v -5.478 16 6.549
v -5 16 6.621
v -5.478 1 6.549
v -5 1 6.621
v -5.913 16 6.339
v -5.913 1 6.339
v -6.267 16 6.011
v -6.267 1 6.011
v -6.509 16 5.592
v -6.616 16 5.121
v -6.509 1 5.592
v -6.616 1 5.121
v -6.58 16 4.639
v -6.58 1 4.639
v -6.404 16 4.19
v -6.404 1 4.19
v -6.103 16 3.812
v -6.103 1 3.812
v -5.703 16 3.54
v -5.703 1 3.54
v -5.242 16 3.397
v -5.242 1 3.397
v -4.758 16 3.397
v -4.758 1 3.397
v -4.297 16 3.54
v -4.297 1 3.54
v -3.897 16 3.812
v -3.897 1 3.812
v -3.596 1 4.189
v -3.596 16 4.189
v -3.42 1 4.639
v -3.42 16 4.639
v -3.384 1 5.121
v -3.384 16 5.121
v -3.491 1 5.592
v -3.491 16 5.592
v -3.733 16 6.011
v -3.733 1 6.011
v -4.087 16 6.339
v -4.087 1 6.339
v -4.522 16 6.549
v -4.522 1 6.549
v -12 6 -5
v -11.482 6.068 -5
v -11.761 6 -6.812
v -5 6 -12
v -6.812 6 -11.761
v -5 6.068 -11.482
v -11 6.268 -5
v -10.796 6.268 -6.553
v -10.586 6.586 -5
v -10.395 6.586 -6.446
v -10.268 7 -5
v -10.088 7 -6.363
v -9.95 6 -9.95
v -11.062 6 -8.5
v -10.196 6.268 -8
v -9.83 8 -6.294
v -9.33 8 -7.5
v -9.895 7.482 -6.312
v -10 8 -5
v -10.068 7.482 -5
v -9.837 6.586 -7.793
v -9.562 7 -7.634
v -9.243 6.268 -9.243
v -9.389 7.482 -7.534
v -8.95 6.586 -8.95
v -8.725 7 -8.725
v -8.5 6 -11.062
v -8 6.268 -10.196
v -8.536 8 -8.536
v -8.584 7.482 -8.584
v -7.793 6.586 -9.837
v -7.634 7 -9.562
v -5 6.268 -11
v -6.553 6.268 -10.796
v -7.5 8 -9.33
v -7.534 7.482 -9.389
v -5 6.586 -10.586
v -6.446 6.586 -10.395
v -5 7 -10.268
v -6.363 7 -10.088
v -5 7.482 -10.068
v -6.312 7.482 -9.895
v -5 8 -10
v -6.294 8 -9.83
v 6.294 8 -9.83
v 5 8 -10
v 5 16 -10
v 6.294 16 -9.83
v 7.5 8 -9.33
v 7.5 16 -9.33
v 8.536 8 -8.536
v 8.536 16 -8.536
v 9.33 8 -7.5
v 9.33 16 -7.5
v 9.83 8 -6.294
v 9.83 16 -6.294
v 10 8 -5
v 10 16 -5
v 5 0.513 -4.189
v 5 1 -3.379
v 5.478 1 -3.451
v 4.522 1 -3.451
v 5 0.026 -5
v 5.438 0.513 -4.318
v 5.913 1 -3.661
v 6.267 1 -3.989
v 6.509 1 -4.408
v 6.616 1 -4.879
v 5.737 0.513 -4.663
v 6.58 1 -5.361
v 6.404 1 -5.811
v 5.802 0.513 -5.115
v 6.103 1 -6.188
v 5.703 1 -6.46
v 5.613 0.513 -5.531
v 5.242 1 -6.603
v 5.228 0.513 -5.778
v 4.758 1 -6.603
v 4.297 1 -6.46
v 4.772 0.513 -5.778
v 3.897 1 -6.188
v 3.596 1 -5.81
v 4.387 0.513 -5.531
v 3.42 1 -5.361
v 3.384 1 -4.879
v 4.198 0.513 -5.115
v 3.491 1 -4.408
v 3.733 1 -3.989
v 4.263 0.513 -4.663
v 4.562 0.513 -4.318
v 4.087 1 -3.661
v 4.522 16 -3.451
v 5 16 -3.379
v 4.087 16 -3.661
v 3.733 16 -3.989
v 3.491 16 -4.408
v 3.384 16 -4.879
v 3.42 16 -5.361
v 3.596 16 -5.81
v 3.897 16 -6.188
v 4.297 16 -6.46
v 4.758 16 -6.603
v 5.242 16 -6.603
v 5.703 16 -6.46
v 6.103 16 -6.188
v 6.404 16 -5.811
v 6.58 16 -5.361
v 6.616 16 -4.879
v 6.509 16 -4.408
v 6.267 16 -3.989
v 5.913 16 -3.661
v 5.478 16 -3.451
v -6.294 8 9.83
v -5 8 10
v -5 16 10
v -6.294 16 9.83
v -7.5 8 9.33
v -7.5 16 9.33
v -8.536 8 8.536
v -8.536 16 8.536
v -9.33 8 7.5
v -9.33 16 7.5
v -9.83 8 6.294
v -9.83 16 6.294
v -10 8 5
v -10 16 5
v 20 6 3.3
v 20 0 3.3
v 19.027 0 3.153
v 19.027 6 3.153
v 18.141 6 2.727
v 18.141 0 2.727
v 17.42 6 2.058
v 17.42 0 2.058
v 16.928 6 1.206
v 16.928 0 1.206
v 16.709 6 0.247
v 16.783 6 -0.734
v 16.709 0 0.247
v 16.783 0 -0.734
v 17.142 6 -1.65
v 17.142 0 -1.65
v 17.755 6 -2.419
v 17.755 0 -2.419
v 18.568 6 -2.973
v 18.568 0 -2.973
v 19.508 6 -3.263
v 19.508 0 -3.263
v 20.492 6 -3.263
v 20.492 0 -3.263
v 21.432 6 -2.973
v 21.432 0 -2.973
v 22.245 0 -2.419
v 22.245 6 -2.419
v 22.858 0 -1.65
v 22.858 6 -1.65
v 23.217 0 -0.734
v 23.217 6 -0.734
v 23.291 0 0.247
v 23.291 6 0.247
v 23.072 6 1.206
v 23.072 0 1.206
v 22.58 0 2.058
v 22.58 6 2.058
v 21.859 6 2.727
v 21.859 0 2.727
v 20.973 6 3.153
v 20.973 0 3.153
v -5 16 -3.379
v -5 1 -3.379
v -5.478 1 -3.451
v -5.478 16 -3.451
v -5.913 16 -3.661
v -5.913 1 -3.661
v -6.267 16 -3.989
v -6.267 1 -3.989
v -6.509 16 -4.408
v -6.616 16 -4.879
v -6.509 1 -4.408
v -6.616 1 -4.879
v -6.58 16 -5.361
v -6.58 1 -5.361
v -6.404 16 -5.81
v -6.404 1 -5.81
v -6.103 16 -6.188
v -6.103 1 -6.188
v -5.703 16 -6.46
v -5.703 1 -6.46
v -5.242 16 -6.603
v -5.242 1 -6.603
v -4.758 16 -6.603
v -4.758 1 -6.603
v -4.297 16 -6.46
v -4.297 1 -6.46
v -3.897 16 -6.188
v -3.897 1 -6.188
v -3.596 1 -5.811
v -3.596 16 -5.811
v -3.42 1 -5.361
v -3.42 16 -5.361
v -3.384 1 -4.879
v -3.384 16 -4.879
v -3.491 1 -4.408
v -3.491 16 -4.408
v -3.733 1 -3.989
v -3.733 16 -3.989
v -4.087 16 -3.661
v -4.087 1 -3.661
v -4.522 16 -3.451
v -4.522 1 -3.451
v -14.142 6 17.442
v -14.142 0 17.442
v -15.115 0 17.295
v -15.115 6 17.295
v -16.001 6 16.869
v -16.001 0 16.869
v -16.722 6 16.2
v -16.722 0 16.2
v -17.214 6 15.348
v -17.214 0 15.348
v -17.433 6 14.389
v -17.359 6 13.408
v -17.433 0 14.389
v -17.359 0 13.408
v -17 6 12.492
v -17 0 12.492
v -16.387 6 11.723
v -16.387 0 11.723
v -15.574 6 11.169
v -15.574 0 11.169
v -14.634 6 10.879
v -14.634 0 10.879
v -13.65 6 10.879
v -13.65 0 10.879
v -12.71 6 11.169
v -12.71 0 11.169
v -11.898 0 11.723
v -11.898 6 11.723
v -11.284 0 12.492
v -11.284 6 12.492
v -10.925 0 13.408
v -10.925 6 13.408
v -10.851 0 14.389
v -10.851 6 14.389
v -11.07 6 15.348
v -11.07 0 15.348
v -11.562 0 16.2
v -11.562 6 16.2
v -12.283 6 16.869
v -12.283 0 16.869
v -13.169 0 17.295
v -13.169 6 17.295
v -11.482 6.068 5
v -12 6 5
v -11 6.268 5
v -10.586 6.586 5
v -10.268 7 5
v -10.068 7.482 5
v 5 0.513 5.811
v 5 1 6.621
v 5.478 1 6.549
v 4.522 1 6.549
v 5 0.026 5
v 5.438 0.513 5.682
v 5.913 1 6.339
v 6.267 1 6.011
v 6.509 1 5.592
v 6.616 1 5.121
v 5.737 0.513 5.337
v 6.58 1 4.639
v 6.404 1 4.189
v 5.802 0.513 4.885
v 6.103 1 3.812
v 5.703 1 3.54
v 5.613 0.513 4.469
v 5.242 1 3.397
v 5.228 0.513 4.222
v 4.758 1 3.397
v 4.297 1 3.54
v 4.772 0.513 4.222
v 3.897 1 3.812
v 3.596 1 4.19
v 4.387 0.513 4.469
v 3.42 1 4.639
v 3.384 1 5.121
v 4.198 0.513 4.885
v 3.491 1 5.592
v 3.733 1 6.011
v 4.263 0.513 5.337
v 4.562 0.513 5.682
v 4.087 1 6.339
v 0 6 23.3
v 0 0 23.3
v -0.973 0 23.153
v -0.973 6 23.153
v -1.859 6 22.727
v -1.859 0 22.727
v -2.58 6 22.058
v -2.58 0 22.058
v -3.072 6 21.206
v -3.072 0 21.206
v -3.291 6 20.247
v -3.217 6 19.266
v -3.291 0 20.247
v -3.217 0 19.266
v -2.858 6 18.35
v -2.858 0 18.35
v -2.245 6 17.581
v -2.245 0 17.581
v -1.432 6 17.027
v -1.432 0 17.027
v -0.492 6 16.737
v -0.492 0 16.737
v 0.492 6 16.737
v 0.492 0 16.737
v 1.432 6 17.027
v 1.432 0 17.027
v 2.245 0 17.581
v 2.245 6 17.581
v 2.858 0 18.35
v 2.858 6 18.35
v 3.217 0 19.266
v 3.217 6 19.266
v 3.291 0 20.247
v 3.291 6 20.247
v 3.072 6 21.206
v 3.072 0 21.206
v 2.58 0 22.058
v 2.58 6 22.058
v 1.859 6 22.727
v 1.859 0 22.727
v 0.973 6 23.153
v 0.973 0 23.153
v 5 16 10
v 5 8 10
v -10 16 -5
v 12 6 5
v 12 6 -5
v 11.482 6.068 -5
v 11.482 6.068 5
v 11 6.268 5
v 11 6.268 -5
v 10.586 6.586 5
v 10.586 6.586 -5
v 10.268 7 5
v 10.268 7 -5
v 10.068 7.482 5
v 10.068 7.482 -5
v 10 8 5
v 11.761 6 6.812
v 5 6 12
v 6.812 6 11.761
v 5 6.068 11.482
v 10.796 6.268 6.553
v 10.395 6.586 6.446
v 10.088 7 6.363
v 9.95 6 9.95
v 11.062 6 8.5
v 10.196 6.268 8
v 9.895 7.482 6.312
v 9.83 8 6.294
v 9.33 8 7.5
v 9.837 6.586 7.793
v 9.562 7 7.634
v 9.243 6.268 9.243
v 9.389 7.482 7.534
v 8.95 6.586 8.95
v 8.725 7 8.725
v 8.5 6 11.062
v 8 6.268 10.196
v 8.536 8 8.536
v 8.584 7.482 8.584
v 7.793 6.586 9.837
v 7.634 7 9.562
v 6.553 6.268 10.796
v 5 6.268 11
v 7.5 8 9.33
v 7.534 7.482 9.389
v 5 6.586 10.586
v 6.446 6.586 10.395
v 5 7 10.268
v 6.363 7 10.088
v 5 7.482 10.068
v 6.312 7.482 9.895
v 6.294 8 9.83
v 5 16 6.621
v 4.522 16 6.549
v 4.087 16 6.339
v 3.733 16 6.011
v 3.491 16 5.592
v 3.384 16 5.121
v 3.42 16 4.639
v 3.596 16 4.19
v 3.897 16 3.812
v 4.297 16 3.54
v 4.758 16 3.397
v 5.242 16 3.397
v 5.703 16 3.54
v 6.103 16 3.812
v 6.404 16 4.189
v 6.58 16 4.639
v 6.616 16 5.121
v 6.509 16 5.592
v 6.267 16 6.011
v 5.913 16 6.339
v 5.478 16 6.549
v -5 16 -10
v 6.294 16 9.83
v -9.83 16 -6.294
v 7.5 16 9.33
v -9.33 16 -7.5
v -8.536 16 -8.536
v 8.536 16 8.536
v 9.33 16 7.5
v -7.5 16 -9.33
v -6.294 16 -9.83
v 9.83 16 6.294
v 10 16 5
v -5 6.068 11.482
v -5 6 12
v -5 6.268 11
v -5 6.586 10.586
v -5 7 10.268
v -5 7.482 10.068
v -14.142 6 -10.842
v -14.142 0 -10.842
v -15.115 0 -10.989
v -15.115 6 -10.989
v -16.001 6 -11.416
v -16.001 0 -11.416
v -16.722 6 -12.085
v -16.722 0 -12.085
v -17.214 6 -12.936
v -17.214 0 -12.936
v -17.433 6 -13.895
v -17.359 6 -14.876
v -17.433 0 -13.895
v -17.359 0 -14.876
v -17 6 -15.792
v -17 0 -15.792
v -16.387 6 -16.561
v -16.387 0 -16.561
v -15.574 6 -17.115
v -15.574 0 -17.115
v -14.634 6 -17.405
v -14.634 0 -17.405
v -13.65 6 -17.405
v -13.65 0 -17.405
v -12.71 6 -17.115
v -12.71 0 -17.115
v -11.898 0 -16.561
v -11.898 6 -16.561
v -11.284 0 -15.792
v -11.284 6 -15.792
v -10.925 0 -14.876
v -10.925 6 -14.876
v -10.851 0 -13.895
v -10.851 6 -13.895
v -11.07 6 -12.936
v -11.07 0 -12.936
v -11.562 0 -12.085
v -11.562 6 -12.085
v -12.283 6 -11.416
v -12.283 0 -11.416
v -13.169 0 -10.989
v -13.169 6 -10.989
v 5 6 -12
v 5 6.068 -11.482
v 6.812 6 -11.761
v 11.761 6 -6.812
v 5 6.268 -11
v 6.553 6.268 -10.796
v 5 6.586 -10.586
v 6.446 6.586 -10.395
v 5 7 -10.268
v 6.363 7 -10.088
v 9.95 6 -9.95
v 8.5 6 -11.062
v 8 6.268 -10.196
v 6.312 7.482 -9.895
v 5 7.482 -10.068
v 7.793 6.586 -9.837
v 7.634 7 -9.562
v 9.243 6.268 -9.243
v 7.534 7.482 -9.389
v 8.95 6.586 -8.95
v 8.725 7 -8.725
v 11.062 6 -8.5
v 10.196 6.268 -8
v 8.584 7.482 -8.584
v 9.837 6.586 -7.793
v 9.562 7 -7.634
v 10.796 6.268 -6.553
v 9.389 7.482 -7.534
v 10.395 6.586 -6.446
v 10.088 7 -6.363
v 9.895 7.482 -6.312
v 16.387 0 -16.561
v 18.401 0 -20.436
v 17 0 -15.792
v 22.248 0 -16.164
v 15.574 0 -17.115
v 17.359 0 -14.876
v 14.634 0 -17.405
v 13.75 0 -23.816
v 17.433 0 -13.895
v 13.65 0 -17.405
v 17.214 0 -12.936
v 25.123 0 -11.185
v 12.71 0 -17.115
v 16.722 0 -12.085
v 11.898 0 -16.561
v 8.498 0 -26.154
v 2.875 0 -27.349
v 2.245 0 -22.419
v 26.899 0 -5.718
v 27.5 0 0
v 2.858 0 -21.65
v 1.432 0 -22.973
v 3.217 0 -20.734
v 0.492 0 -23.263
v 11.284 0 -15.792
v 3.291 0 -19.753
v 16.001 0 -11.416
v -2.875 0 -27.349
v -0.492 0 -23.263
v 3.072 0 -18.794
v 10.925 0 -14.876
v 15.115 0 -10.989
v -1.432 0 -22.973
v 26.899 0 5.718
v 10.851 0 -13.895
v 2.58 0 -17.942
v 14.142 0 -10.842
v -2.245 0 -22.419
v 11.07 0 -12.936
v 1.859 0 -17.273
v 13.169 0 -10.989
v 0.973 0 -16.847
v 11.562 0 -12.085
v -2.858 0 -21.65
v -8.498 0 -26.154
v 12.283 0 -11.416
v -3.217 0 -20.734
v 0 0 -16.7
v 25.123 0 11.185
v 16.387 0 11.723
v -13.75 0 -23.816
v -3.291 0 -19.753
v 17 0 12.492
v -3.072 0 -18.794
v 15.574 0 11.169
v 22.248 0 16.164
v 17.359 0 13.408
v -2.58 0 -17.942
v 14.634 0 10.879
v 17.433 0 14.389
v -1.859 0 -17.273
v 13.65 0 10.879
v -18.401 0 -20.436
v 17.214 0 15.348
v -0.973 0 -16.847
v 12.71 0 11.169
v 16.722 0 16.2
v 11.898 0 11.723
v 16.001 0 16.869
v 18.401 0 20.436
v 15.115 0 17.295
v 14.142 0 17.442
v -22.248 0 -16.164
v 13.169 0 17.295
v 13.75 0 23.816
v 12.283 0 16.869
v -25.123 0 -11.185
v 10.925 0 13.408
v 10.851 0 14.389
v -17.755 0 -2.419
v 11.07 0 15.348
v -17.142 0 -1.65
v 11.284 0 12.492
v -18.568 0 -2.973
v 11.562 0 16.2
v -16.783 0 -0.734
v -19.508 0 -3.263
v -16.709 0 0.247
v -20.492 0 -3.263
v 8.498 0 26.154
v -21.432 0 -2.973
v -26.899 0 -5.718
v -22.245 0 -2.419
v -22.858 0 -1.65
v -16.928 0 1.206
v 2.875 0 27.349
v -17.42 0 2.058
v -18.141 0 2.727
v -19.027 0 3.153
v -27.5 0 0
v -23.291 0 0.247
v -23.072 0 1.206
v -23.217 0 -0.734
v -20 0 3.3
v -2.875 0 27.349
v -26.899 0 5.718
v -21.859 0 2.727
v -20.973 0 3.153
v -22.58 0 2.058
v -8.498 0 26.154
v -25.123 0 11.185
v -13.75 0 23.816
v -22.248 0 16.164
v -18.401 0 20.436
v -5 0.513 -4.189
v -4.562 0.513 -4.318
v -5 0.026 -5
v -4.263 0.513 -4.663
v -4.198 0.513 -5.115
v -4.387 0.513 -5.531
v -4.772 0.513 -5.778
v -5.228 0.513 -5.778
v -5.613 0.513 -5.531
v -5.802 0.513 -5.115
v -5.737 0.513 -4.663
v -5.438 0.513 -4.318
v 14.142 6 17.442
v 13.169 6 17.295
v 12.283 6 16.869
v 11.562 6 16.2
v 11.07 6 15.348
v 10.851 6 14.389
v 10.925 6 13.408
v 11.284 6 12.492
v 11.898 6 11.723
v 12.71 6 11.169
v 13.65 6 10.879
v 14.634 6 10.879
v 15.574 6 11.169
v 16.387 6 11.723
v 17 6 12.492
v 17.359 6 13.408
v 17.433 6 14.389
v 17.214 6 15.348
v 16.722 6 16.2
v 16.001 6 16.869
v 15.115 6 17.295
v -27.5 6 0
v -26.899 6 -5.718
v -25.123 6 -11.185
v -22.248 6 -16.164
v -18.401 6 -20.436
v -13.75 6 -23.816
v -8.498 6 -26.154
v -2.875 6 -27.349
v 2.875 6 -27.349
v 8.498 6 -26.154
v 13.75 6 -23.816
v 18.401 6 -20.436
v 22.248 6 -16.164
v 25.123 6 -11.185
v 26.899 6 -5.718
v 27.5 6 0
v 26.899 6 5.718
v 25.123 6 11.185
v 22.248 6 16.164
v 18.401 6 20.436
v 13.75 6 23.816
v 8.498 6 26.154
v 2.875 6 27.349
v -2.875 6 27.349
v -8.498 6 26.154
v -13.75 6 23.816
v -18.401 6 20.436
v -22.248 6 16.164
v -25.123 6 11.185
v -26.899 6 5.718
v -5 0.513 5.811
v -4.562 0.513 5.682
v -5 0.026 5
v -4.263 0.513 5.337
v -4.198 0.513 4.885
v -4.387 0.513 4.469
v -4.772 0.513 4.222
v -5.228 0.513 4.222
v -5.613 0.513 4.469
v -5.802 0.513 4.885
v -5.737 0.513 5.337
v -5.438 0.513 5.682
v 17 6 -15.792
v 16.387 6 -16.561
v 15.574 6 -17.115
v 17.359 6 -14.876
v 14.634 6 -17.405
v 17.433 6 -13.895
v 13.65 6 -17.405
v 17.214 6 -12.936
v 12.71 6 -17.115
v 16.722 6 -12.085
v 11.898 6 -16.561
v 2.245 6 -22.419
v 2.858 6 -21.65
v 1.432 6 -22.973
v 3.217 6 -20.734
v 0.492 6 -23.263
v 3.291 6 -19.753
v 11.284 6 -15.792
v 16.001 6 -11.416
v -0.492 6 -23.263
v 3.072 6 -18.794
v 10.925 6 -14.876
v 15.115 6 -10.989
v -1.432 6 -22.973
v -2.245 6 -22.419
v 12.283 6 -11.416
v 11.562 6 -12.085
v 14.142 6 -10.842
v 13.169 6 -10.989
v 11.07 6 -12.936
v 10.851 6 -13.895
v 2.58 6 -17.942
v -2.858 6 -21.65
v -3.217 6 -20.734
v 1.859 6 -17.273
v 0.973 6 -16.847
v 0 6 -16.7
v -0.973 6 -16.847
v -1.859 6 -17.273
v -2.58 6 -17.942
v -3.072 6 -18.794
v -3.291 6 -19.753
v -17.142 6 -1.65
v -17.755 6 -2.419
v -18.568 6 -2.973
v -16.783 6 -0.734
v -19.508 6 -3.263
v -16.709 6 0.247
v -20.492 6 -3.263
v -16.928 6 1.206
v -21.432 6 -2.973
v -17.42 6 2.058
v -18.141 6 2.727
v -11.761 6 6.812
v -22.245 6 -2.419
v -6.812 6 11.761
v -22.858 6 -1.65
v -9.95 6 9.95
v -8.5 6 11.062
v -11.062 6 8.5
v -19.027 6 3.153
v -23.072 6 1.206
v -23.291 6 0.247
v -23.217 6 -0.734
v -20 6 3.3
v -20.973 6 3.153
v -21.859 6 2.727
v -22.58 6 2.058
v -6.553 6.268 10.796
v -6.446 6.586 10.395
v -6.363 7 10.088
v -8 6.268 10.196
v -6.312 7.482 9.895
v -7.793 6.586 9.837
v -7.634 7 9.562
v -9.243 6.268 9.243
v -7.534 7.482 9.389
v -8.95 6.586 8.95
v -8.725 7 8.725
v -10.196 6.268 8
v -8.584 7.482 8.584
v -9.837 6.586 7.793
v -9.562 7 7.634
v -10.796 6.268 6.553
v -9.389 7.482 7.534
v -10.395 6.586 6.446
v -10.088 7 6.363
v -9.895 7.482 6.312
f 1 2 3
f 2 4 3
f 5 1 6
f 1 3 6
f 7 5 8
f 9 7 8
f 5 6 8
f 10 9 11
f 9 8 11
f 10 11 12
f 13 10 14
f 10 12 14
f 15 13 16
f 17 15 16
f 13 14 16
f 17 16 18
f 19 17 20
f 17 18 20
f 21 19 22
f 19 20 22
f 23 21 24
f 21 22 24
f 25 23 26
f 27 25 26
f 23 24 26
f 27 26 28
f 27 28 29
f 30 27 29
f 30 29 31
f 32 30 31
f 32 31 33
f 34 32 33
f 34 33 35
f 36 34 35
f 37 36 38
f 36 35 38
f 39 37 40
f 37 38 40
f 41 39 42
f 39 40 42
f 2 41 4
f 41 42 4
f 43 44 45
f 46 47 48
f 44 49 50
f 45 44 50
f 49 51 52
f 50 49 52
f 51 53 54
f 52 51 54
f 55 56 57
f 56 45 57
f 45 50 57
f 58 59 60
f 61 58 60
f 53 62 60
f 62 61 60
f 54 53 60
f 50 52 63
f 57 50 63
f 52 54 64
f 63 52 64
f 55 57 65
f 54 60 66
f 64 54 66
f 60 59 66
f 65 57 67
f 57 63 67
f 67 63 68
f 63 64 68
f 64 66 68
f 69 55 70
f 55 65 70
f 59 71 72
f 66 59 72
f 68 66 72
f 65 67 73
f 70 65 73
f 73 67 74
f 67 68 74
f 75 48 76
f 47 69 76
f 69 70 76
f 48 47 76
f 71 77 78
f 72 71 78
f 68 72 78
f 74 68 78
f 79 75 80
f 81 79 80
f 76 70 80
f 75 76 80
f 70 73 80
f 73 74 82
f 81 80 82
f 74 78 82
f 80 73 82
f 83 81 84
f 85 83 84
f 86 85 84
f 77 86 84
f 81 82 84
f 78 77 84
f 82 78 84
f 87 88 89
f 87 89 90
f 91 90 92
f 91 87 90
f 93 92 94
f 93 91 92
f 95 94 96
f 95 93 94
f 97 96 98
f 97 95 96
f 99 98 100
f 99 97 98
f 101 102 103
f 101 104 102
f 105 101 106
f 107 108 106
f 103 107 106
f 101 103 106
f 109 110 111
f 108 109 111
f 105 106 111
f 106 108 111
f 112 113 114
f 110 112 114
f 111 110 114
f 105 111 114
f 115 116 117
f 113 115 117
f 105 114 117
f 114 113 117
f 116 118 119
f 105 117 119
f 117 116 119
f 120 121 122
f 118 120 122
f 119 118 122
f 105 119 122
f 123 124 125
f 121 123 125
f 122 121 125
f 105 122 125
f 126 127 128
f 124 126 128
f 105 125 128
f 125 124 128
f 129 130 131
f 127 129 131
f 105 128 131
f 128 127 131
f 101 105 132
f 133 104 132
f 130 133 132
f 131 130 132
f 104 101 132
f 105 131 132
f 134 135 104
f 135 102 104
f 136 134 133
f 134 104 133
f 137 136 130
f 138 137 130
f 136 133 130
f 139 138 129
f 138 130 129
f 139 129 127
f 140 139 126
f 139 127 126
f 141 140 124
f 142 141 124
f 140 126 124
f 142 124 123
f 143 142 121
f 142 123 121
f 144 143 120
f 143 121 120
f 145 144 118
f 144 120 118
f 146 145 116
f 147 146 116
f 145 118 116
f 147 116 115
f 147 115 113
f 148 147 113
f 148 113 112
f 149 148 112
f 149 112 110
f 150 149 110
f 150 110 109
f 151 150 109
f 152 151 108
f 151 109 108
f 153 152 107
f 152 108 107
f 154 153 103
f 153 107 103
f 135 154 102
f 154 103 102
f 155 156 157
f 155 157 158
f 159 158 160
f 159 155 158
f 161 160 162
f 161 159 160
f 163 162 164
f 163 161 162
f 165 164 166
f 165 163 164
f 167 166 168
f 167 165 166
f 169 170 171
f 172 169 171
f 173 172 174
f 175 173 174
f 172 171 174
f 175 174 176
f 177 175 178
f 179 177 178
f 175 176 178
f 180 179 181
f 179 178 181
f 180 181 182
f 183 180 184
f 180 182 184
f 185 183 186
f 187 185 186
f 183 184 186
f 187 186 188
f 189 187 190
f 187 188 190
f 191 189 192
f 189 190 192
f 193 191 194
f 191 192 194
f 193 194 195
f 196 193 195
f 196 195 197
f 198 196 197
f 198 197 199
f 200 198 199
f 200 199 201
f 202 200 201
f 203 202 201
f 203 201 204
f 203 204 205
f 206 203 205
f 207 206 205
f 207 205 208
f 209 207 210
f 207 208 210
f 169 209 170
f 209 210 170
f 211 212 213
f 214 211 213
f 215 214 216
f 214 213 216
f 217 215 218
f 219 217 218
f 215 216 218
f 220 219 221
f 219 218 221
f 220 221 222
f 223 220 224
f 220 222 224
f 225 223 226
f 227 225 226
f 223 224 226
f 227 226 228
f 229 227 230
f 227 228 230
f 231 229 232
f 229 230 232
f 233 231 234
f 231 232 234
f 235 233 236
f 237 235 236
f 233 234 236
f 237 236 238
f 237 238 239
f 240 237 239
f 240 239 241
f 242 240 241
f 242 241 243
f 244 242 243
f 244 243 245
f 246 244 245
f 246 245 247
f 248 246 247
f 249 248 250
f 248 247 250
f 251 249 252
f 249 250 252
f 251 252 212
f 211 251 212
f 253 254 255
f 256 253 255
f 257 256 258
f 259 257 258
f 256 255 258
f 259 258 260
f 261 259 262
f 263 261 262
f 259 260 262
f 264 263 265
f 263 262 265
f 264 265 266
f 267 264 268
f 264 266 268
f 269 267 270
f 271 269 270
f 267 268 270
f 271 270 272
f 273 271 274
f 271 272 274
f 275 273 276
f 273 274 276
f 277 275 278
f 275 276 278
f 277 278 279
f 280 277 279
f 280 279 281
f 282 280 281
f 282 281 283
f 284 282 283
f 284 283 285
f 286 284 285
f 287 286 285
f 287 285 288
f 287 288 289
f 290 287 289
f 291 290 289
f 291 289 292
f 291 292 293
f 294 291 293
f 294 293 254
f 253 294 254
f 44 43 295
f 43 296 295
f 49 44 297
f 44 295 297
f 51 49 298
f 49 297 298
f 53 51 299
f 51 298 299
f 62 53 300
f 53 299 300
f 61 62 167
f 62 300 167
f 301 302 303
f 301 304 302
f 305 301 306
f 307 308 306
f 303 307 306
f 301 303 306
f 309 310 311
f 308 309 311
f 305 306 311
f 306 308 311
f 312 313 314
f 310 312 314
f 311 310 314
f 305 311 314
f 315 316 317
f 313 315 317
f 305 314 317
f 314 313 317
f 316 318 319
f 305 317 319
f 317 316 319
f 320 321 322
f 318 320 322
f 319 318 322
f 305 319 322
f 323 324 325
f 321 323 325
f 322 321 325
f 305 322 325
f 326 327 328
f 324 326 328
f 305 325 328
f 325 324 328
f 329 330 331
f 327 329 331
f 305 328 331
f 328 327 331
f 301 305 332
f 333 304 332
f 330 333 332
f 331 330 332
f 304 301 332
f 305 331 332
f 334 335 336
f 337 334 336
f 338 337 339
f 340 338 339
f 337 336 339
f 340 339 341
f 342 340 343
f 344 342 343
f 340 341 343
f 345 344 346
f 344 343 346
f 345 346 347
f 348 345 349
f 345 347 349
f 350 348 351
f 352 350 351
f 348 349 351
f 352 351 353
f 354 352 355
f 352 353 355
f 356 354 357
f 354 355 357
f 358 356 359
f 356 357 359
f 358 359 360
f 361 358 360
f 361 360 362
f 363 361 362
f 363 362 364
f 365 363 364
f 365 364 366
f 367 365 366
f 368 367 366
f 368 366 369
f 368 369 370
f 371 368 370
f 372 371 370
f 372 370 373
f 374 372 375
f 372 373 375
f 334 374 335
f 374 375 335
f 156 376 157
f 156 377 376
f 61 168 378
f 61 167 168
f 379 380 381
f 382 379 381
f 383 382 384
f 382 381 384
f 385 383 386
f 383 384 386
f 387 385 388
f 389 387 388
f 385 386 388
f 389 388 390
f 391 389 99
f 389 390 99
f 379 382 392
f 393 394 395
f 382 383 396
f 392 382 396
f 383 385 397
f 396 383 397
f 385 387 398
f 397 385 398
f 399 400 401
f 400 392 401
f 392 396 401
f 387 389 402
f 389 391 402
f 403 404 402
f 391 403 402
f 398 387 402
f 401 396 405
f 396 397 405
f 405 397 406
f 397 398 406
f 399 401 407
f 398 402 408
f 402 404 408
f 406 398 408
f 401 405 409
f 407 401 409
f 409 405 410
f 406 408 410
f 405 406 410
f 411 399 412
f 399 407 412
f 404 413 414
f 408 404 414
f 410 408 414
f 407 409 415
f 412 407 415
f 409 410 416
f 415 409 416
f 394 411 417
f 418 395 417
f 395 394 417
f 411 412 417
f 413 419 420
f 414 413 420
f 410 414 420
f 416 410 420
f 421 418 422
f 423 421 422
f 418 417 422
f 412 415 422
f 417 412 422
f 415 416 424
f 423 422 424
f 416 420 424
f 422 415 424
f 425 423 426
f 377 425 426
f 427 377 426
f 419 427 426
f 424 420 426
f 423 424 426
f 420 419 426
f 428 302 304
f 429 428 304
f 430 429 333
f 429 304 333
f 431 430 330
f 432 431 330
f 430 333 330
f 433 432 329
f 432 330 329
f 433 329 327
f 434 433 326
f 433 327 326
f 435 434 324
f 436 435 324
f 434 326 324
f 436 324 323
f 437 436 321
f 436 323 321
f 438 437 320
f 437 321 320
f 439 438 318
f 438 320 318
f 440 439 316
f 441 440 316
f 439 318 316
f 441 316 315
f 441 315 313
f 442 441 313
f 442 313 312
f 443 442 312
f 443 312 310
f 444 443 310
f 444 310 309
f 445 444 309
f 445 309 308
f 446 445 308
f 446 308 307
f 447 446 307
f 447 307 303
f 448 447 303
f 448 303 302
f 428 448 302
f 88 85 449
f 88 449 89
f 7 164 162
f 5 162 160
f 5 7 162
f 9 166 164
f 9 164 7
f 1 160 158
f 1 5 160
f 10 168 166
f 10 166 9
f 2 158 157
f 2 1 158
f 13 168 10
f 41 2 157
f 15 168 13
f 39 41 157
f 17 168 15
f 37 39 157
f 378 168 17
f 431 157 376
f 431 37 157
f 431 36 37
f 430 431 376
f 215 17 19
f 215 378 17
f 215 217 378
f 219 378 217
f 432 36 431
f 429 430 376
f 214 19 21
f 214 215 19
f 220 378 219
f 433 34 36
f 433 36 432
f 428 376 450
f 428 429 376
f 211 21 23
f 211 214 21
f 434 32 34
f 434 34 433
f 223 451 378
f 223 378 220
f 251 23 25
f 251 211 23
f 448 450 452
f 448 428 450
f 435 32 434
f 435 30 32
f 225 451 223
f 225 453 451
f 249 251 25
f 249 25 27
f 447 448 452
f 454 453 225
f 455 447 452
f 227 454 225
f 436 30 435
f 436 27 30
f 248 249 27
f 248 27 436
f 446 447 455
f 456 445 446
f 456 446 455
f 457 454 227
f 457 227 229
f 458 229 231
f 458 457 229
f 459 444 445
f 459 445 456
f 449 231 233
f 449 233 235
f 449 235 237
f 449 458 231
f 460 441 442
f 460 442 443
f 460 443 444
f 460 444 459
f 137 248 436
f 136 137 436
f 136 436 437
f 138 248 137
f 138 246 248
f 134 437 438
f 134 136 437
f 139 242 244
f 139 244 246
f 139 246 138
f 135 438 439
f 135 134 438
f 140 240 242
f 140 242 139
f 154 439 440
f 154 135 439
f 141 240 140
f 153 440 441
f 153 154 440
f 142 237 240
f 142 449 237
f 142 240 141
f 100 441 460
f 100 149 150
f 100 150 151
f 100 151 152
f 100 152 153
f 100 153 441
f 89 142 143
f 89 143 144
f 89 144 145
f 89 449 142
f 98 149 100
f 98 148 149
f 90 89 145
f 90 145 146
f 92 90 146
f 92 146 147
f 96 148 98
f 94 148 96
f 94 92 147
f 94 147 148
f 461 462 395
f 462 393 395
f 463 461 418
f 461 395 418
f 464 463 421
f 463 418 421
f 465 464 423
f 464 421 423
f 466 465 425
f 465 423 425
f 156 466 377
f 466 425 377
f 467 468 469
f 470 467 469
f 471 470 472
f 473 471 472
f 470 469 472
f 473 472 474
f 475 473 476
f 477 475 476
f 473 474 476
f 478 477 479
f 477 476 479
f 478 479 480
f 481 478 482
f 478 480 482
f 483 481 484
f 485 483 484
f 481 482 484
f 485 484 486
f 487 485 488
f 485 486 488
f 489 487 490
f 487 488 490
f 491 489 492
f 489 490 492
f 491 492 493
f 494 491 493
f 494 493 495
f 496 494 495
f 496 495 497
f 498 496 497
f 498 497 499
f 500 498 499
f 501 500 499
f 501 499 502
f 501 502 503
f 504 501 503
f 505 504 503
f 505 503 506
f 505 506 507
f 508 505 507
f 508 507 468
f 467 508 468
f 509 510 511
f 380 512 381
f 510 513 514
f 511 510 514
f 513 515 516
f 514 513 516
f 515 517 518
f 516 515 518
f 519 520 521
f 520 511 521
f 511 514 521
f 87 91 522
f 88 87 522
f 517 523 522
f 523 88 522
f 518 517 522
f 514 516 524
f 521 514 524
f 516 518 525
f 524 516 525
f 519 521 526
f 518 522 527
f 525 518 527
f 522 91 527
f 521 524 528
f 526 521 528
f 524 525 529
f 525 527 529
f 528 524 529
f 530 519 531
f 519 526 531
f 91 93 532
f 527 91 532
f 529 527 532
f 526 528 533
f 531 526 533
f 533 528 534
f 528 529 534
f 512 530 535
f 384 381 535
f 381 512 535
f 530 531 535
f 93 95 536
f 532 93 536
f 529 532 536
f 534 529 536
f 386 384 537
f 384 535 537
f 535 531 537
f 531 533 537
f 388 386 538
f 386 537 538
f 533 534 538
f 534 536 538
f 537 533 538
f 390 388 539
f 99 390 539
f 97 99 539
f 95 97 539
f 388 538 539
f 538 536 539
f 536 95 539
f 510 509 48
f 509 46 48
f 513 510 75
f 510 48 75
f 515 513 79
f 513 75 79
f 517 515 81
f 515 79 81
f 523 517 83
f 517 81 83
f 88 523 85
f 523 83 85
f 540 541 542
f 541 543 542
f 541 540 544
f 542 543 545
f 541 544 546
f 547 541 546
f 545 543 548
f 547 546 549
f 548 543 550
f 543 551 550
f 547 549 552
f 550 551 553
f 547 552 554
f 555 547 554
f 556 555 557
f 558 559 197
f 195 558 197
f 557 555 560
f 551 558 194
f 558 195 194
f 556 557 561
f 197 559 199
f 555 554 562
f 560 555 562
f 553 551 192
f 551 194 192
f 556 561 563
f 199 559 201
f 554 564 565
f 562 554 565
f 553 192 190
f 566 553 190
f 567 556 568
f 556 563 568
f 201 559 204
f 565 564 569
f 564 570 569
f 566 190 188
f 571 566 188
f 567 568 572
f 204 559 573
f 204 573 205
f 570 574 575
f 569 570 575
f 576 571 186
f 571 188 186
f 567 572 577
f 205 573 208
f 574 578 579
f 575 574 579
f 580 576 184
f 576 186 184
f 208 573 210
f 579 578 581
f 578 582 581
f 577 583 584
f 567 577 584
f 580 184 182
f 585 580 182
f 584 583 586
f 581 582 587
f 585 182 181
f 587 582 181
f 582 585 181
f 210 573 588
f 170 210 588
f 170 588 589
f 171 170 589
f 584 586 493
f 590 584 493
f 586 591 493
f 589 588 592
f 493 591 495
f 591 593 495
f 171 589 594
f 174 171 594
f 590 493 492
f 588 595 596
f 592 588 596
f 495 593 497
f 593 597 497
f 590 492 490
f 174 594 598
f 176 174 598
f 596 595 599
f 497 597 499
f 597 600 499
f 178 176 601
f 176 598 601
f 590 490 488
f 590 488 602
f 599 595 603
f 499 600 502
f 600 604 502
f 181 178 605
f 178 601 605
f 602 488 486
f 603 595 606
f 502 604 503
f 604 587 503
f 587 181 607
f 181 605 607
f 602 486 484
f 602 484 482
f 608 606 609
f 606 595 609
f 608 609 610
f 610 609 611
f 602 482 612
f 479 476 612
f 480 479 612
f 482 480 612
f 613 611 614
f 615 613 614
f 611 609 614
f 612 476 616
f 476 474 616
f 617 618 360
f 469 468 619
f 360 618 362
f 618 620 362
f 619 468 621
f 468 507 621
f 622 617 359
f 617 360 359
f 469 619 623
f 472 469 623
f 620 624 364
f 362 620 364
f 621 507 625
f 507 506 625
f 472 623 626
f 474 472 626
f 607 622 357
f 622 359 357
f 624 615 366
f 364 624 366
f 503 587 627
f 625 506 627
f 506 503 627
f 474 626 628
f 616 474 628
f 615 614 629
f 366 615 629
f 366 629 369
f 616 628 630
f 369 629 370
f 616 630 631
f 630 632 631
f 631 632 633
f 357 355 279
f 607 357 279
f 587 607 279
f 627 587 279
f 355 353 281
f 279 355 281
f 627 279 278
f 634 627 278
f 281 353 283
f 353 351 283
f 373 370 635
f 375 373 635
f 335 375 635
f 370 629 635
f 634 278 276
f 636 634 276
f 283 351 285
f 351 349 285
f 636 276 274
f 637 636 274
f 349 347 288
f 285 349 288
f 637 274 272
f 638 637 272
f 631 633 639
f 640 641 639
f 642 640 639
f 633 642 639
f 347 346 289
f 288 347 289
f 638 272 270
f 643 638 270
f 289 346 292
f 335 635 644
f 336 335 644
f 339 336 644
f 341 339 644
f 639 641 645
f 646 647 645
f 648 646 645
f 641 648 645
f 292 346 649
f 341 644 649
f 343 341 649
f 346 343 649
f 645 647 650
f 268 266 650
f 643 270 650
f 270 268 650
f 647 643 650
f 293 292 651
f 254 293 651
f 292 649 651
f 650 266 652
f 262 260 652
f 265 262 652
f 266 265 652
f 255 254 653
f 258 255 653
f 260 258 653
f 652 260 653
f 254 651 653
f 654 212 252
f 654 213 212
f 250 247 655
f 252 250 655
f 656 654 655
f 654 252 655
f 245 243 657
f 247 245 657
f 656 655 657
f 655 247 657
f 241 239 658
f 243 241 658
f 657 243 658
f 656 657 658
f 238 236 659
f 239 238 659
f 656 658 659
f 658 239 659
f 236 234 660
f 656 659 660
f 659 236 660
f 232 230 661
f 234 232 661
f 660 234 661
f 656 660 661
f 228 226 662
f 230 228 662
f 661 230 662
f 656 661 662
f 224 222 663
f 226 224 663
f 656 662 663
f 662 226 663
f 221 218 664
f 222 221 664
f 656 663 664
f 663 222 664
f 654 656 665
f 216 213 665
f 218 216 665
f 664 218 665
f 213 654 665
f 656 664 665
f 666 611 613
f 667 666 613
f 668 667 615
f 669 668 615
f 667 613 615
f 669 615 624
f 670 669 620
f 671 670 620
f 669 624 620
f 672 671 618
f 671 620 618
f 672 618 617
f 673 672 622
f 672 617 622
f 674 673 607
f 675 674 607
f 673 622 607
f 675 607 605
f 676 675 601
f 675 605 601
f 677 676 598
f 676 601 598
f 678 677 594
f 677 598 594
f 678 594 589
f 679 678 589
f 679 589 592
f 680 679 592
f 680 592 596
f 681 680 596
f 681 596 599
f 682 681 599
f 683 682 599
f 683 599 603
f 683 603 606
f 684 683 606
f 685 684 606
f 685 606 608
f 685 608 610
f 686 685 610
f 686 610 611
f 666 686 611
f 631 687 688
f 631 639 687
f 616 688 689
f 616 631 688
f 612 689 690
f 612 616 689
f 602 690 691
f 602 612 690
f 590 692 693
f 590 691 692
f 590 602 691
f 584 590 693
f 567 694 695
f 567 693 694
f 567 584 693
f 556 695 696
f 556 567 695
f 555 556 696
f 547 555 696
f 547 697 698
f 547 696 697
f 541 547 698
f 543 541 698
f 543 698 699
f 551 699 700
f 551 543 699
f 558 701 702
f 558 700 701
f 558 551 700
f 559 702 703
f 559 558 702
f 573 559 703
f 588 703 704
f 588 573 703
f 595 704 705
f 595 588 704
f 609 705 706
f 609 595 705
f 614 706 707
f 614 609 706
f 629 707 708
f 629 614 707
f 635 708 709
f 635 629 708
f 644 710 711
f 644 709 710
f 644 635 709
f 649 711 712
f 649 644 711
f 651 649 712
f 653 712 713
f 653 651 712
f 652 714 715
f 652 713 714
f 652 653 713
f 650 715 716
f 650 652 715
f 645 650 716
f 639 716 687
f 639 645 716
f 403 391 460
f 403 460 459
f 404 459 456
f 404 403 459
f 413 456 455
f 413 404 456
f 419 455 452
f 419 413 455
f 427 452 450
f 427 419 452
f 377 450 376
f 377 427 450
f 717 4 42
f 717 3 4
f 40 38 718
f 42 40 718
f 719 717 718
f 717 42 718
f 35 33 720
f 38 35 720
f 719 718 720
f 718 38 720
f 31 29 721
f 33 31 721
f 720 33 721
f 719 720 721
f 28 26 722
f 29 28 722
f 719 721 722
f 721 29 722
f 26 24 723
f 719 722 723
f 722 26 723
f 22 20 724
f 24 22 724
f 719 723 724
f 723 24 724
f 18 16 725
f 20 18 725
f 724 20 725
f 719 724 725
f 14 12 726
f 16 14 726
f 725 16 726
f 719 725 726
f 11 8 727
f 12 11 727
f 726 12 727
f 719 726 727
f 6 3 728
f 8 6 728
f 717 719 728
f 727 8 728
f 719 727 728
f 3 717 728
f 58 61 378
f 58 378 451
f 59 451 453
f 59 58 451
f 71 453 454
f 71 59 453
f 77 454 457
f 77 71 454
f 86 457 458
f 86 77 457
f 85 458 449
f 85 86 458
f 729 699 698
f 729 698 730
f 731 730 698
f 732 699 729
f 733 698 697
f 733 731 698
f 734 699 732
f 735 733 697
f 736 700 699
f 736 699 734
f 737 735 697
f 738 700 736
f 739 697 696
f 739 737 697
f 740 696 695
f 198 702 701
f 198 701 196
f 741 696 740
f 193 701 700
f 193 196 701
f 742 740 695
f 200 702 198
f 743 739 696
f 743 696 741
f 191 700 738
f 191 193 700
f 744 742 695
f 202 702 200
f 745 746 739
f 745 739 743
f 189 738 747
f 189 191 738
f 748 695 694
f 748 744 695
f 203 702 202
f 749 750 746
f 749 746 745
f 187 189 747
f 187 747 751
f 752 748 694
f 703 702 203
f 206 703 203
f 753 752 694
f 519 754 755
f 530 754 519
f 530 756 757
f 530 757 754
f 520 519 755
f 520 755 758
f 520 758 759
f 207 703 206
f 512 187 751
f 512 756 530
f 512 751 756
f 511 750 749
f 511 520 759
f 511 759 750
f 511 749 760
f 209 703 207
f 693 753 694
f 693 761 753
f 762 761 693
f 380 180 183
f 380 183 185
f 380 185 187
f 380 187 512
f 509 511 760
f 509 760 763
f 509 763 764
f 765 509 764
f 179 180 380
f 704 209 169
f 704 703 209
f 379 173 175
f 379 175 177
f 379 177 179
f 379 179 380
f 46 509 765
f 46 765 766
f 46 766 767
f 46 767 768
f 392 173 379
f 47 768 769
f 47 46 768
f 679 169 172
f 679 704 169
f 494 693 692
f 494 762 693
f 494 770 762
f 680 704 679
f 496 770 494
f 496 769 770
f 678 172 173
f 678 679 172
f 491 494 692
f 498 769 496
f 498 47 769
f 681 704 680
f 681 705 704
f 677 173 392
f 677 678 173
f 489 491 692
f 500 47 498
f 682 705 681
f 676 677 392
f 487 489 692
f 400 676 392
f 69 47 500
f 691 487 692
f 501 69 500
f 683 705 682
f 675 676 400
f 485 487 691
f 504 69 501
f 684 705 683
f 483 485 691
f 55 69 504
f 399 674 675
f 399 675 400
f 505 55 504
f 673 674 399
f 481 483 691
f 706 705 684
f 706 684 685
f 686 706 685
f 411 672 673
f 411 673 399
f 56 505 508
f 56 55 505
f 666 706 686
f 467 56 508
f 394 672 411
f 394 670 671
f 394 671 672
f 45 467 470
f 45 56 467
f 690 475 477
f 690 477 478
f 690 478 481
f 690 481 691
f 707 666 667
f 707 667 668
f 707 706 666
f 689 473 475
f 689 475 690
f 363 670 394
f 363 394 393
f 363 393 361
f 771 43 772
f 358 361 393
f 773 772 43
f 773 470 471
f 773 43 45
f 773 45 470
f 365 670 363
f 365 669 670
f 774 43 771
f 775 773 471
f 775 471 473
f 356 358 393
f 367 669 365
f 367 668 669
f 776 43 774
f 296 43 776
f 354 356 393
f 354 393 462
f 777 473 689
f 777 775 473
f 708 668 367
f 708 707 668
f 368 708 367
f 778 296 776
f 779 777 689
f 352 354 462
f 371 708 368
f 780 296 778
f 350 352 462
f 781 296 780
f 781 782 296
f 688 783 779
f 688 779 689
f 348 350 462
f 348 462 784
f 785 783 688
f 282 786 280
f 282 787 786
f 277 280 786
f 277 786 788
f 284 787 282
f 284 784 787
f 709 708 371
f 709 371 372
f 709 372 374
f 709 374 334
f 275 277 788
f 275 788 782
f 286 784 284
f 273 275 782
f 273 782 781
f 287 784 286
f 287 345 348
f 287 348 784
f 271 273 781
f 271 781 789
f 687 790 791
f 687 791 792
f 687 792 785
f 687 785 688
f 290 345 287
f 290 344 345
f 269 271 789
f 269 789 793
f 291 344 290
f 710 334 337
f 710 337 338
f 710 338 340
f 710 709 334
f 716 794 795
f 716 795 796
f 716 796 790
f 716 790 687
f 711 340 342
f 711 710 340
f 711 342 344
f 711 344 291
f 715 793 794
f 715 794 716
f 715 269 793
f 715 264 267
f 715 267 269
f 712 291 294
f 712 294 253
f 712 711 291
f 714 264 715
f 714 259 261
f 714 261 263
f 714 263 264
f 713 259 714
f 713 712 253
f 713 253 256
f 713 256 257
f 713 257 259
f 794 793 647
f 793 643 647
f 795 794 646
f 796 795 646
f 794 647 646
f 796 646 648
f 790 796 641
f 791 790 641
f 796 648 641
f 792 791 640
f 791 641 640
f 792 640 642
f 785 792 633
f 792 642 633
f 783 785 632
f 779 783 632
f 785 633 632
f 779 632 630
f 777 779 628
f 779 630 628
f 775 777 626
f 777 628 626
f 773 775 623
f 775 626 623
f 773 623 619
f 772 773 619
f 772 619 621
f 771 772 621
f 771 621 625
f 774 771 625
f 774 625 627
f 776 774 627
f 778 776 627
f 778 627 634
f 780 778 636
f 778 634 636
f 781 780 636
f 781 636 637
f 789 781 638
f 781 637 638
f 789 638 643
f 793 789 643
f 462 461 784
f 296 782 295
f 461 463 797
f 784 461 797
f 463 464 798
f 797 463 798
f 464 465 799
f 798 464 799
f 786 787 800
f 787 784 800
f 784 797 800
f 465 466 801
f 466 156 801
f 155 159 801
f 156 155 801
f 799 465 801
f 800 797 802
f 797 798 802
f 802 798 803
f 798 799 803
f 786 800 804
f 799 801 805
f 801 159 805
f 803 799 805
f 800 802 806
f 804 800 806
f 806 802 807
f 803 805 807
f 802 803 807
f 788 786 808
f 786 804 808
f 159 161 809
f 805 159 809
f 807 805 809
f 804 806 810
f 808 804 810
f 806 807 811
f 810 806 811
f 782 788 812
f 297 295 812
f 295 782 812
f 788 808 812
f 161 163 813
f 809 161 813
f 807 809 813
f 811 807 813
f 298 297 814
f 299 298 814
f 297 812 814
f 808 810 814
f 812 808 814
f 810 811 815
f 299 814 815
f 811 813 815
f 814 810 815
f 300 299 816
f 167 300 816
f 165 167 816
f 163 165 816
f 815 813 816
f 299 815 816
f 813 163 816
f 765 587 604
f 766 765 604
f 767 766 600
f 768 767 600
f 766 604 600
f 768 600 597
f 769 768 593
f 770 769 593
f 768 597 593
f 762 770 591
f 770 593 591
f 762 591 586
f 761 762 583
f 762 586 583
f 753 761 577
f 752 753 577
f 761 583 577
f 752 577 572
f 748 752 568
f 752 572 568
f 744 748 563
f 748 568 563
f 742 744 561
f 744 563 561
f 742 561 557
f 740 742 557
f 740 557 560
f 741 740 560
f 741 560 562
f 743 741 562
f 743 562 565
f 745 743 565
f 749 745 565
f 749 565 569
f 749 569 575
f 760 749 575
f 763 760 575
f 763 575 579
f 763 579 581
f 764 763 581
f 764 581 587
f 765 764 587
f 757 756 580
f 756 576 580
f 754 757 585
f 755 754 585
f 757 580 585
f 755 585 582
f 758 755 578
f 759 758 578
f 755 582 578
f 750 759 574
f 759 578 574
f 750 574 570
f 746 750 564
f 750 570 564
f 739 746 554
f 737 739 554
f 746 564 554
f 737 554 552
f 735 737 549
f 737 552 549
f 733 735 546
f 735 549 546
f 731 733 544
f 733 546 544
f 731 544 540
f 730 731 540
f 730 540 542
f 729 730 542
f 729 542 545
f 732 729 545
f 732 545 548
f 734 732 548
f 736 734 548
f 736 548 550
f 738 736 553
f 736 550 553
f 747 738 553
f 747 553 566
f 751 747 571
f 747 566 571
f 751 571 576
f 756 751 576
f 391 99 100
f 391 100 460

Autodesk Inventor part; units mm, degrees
ref_plane "YZ Plane" through (0, 0, 0) normal (1, 0, 0) x (0, 1, 0)
ref_plane "XZ Plane" through (0, 0, 0) normal (0, 1, 0) x (-1, 0, 0)
ref_plane "XY Plane" through (0, 0, 0) normal (0, 0, 1) x (1, 0, 0)
sketch "Sketch1" plane through (0, 0, 0) normal (0, 1, 0) x (-1, 0, 0)
  circle A0 centre (0, 0) radius 27.5
  dimension "d0" = 55
extrude "Extrusion1" add sketch "Sketch1" along normal blind 6
sketch "Sketch2" plane through (0, 6, 0) normal (0, 1, 0) x (1, 0, 0)
  circle A0 centre (0, 0) radius 27.5 projected
  point P0 (20, 0)
  point P1 (14.1421, 14.1421)
  point P2 (0, 20)
  point P3 (-14.1421, 14.1421)
  point P4 (-20, 0)
  point P5 (-14.1421, -14.1421)
  point P6 (0, -20)
  point P7 (14.1421, -14.1421)
  dimension "d3" = 20
  dimension "d6" = 360
hole "Hole1" at (20, 6, 0) at (14.1421, 6, -14.1421) at (0, 6, -20) at (-14.1421, 6, -14.1421) at (-20, 6, 0) at (-14.1421, 6, 14.1421) at (0, 6, 20) at (14.1421, 6, 14.1421) direction (0, -1, 0) diameter 6.6 depth 8 tip angle 118 clearance for "Flat Head Machine Screw" size "M6" standard "Ansi Metric M Profile"
sketch "Sketch3" plane through (0, 6, 0) normal (0, 1, 0) x (1, 0, 0)
  circle A0 centre (0, 0) radius 27.5 projected
  line L0 (-5, 10) -> (5, 10)
  line L1 (10, 5) -> (10, -5)
  line L2 (5, -10) -> (-5, -10)
  line L3 (-10, -5) -> (-10, 5)
  arc A1 (-5, 10) -> (-10, 5) centre (-5, 5) ccw
  arc A2 (10, 5) -> (5, 10) centre (5, 5) ccw
  arc A3 (5, -10) -> (10, -5) centre (5, -5) ccw
  arc A4 (-10, -5) -> (-5, -10) centre (-5, -5) ccw
  point P0 (0, 10)
  point P1 (10, 0)
  dimension "d15" = 5
  dimension "d16" = 20
  dimension "d17" = 20
extrude "Extrusion2" add sketch "Sketch3" along normal blind 10 contours L0 A2 L1 A3 L2 A4 L3 A1
sketch "Sketch4" plane through (0, 16, 0) normal (0, 1, 0) x (1, 0, 0)
  arc A0 (-5, 10) -> (-10, 5) centre (-5, 5) ccw projected
  arc A1 (-10, -5) -> (-5, -10) centre (-5, -5) ccw projected
  arc A2 (5, -10) -> (10, -5) centre (5, -5) ccw projected
  arc A3 (10, 5) -> (5, 10) centre (5, 5) ccw projected
  point P0 (0, 0)
hole "Hole2" at (-5, 16, -5) at (5, 16, -5) at (5, 16, 5) at (-5, 16, 5) direction (0, -1, 0) diameter 3.242 depth 15 tip angle 118 thread size "M4x0.7" class "6H" standard "ANSI Metric M Profile"
fillet "Fillet1" radius 2 8 edges at (8.5355, 6, -8.5355) (10, 6, 0) (8.5355, 6, 8.5355) (0, 6, 10) (-8.5355, 6, 8.5355) (-10, 6, 0) (-8.5355, 6, -8.5355) (0, 6, -10)
properties part number "simple_holder_right_angle"
